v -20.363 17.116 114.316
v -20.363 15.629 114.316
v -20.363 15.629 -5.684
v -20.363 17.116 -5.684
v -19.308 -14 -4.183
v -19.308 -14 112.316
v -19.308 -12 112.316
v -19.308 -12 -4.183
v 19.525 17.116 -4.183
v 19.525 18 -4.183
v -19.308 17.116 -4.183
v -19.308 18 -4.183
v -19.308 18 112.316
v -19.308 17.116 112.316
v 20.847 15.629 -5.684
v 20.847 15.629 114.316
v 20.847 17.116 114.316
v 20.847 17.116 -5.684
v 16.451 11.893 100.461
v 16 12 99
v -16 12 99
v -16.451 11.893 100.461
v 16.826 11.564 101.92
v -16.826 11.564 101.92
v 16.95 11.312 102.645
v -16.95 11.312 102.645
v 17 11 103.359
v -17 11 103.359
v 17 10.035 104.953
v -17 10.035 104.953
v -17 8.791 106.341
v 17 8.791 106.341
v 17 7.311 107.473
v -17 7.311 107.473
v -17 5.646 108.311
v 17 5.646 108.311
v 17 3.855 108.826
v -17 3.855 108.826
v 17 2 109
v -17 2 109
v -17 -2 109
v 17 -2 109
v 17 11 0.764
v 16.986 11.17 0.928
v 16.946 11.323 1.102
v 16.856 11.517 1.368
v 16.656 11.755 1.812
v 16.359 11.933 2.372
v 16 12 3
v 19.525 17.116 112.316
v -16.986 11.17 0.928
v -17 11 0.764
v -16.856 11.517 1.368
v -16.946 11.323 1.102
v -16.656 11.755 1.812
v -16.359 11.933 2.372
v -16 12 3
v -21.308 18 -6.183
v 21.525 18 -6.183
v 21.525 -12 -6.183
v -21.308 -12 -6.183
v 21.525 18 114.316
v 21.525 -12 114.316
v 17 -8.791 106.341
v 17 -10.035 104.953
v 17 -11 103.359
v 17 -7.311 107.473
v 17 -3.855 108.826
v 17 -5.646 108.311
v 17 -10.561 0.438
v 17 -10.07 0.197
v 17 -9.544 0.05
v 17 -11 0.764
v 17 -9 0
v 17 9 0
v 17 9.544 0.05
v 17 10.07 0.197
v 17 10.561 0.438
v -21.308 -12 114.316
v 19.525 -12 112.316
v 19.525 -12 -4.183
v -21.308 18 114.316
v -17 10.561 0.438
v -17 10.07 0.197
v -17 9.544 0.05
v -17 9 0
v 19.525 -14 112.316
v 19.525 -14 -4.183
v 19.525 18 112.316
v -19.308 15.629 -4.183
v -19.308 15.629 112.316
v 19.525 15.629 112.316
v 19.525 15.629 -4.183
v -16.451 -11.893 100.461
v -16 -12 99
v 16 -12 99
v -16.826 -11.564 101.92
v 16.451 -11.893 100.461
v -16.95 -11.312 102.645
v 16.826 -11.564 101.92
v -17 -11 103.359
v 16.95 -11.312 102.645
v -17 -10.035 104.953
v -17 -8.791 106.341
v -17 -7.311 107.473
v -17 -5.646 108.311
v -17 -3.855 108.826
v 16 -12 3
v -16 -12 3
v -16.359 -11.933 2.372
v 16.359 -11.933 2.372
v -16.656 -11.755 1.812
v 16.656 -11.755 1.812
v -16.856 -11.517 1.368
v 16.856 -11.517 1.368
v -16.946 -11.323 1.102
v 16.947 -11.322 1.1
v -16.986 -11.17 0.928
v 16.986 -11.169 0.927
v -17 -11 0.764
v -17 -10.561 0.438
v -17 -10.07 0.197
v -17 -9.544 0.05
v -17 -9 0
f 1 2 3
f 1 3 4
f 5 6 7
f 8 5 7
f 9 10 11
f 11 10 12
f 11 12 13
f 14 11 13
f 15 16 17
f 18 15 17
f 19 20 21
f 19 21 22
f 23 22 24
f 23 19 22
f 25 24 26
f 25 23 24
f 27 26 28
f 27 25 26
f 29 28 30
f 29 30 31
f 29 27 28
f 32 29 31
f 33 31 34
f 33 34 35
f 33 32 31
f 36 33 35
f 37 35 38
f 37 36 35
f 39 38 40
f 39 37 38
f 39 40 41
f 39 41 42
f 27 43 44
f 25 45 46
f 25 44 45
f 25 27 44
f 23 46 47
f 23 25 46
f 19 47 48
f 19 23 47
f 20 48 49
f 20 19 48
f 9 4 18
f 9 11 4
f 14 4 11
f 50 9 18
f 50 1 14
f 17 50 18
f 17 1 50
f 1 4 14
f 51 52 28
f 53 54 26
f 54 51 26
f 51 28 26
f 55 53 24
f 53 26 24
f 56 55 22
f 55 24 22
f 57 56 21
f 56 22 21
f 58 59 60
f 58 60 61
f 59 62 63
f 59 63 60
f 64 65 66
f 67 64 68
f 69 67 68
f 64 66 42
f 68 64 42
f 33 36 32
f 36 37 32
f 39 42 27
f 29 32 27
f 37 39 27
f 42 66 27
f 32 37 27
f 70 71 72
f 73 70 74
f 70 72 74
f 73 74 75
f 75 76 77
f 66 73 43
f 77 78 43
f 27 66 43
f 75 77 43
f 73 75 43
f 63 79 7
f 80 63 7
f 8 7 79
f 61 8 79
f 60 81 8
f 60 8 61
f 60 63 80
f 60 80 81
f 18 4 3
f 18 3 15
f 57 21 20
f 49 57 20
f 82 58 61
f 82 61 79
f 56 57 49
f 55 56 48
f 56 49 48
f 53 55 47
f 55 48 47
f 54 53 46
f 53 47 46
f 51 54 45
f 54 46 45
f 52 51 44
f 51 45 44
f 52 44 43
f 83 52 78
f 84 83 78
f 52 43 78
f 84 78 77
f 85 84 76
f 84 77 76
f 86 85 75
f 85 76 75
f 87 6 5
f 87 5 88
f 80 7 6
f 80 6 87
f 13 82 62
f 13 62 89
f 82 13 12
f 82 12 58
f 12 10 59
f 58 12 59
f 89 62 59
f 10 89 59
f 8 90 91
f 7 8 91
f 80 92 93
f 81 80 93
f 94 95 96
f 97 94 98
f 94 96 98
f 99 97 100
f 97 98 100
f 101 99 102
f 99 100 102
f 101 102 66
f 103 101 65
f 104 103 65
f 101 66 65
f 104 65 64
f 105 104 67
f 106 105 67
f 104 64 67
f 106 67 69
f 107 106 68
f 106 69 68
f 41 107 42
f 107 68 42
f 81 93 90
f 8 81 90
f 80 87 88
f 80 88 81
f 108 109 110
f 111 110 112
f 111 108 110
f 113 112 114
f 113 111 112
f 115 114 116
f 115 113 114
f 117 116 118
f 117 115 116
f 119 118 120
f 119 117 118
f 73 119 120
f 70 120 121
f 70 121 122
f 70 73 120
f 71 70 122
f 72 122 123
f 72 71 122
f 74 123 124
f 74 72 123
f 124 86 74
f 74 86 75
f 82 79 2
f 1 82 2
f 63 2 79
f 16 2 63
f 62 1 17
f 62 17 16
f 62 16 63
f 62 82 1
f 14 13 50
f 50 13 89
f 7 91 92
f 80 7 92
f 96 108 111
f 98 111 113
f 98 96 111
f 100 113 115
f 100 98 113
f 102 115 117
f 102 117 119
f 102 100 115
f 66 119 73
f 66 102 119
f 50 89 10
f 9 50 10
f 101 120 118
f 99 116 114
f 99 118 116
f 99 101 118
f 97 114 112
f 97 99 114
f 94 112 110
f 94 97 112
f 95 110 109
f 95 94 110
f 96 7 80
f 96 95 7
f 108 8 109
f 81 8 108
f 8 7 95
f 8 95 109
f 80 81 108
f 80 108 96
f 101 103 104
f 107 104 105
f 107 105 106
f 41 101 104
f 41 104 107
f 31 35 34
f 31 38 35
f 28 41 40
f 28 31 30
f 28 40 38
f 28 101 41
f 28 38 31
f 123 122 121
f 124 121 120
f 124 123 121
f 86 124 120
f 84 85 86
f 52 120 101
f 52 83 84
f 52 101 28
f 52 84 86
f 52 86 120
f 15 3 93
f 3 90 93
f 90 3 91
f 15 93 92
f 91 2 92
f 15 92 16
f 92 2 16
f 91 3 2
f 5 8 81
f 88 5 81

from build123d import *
from OCP.BRepFilletAPI import BRepFilletAPI_MakeFillet

# Parameters (mm, degrees)
SKETCH1_W                  = 34
SKETCH1_H                  = 24
BOSS_EXTRUDE1_DEPTH        = 109
FILLET1_R1                 = 3
FILLET1_R2                 = 1
FILLET1_R3                 = 10
SURFACE_EXTRUSION1_1_BACK  = 30
SURFACE_EXTRUSION1_1_DEPTH = 30
EPAISSIR1_T1               = 2
EPAISSIR2_START            = -4.183446705
EPAISSIR2_OUTLINE_W        = 38.83303867
EPAISSIR2_OUTLINE_H        = 2
EPAISSIR2_DEPTH            = 116.499116009
ESQUISSE3_W                = 41.210599086
ESQUISSE3_H                = 1.486783871
ENL_V_MAT_EXTRU_1_DEPTH    = 120


# Read off the part's stored shape, not the designer's step: Epaissir2
with BuildPart() as part:
    # Sketch1 → Boss-Extrude1 (new body)
    with BuildSketch(Plane.XY):
        Rectangle(SKETCH1_W, SKETCH1_H)
    extrude(amount=BOSS_EXTRUDE1_DEPTH)

    # Fillet1: one fillet with a radius per group of edges: ONE call of the kernel's fillet builder (fillet() takes one radius for all edges)
    fillet1_edges_1 = [part.edges().sort_by_distance(p)[0] for p in [
        (0, 12, 0),
        (0, -12, 0),
    ]]
    fillet1_edges_2 = [part.edges().sort_by_distance(p)[0] for p in [
        (17, 12, 54.5),
        (-17, 12, 54.5),
        (17, -12, 54.5),
        (-17, -12, 54.5),
    ]]
    fillet1_edges_3 = [part.edges().sort_by_distance(p)[0] for p in [
        (0, 12, 109),
        (0, -12, 109),
    ]]
    fillet1 = BRepFilletAPI_MakeFillet(part.part.solid().wrapped)
    for e in fillet1_edges_1:
        fillet1.Add(FILLET1_R1, e.wrapped)
    for e in fillet1_edges_2:
        fillet1.Add(FILLET1_R2, e.wrapped)
    for e in fillet1_edges_3:
        fillet1.Add(FILLET1_R3, e.wrapped)
    add(Compound.cast(fillet1.Shape()), mode=Mode.REPLACE)



with BuildPart() as body_2:
    # Surface-Extrusion1: a surface, the sketch's curves swept straight by 30 mm
    with BuildLine(Plane.XZ.offset(12).offset(-SURFACE_EXTRUSION1_1_BACK), mode=Mode.PRIVATE) as surface_extrusion1_1_path:
        Line((-19.30804716, 112.315669304), (19.52499151, 112.315669304))
        Line((19.52499151, 112.315669304), (19.52499151, -4.183446705))
        Line((19.52499151, -4.183446705), (-19.30804716, -4.183446705))
        Line((-19.30804716, -4.183446705), (-19.30804716, 112.315669304))
    surface_extrusion1_1 = Shell.extrude(surface_extrusion1_1_path.wire(), (0 * SURFACE_EXTRUSION1_1_DEPTH, -1 * SURFACE_EXTRUSION1_1_DEPTH, 0 * SURFACE_EXTRUSION1_1_DEPTH))
    add(Solid.thicken(surface_extrusion1_1, EPAISSIR1_T1))


with BuildPart() as part_1:
    add(part.part)

    add(body_2.part)  # Epaissir2 merges body 2
    # Epaissir2 outline → Epaissir2 (add)
    with BuildSketch(Plane.XY.offset(EPAISSIR2_START)):
        with Locations((0.108472175, -13)):
            Rectangle(EPAISSIR2_OUTLINE_W, EPAISSIR2_OUTLINE_H)
    extrude(amount=EPAISSIR2_DEPTH)

    # Esquisse3 → Enlèv. mat.-Extru.1 (cut)
    with BuildSketch(Plane.XY.offset(114.315669304)):
        with Locations((0.241901497, 16.372244085)):
            Rectangle(ESQUISSE3_W, ESQUISSE3_H)
    extrude(amount=-ENL_V_MAT_EXTRU_1_DEPTH, mode=Mode.SUBTRACT)


solid = part_1.part
